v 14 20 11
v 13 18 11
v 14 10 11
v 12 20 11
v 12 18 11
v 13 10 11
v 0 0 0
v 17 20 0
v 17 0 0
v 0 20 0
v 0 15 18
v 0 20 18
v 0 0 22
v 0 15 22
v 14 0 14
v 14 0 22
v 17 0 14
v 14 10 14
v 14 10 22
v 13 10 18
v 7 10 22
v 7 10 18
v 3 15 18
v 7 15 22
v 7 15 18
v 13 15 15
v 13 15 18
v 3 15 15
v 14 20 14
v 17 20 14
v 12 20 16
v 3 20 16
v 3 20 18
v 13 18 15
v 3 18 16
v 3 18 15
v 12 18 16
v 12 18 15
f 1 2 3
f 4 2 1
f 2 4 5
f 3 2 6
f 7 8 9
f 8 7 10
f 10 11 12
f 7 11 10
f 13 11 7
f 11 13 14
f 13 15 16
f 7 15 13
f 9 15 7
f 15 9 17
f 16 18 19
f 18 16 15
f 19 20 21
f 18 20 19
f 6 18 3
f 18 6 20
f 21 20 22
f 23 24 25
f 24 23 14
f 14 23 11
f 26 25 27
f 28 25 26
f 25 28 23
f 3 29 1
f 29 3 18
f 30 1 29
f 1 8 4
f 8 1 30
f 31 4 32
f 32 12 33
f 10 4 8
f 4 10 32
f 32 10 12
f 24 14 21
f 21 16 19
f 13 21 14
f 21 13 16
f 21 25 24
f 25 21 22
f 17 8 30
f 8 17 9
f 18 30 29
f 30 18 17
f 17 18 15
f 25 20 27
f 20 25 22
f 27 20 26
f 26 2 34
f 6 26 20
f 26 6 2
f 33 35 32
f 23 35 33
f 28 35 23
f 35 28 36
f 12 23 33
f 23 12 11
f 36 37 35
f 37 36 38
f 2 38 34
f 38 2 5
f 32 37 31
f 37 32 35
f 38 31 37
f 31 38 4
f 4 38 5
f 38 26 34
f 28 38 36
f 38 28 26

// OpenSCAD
translate([3.5, 2.5, 5.5]) color([0.9007258804640697, 0.14067978971908934, 0.5728503338092871]) cube([7, 5, 11], center=true);
translate([10.5, 2.5, 5.5]) color([0.1912043400515635, 0.43401891336511733, 0.7163457448050065]) cube([7, 5, 11], center=true);
translate([3.5, 7.5, 5.5]) color([0.3841301513333275, 0.33069552050314754, 0.6480049557775331]) cube([7, 5, 11], center=true);
translate([10.5, 7.5, 5.5]) color([0.6874717059379091, 0.14801928734251768, 0.93323205939552]) cube([7, 5, 11], center=true);
translate([3.5, 12.5, 5.5]) color([0.14750072005511716, 0.31607169754224296, 0.2088660889148145]) cube([7, 5, 11], center=true);
translate([10.5, 12.5, 5.5]) color([0.1868244368145192, 0.3491672112743387, 0.9834841816788549]) cube([7, 5, 11], center=true);
translate([3.5, 17.5, 5.5]) color([0.427290207198605, 0.49195852420878716, 0.7297831417632067]) cube([7, 5, 11], center=true);
translate([10.5, 17.5, 5.5]) color([0.7955834433152874, 0.43927203819181504, 0.2042687131951023]) cube([7, 5, 11], center=true);
translate([3.5, 2.5, 16.5]) color([0.709997013582239, 0.9058221085991531, 0.03327924187503195]) cube([7, 5, 11], center=true);
translate([10.5, 2.5, 16.5]) color([0.6331757983912308, 0.8710093735661795, 0.3636101637556439]) cube([7, 5, 11], center=true);
translate([3.5, 7.5, 16.5]) color([0.7431628081058981, 0.6774926049513658, 0.23306417175218364]) cube([7, 5, 11], center=true);
translate([10.5, 7.5, 16.5]) color([0.2975271762349214, 0.0866296567389645, 0.8688435220131177]) cube([7, 5, 11], center=true);
translate([3.5, 12.5, 16.5]) color([0.7514921149941085, 0.7714305883456576, 0.8829516943772963]) cube([7, 5, 11], center=true);
translate([15.5, 2.5, 3.5]) color([0.4114323292545551, 0.05394001775890156, 0.696805048854085]) cube([3, 5, 7], center=true);
translate([15.5, 7.5, 3.5]) color([0.6656296547984208, 0.6485122289860075, 0.5471816206705559]) cube([3, 5, 7], center=true);
translate([15.5, 12.5, 3.5]) color([0.7344166333532061, 0.4306045068871984, 0.45460236437769275]) cube([3, 5, 7], center=true);
translate([15.5, 17.5, 3.5]) color([0.25475221651879554, 0.47565246533915095, 0.3371942584654095]) cube([3, 5, 7], center=true);
translate([15.5, 2.5, 10.5]) color([0.04223511400675217, 0.05255331220371673, 0.34980223330761895]) cube([3, 5, 7], center=true);
translate([15.5, 7.5, 10.5]) color([0.2898096938030986, 0.007130057665757694, 0.06369015415518986]) cube([3, 5, 7], center=true);
translate([15.5, 12.5, 10.5]) color([0.42774457246440645, 0.22216650821772055, 0.6086379170158094]) cube([3, 5, 7], center=true);
translate([15.5, 17.5, 10.5]) color([0.557768500755667, 0.22097295115667703, 0.19284823789822858]) cube([3, 5, 7], center=true);
translate([8.5, 12.5, 14.5]) color([0.6083188139076446, 0.606354511401297, 0.08562053587131313]) cube([3, 5, 7], center=true);
translate([11.5, 12.5, 14.5]) color([0.31903016062772993, 0.53590115499306, 0.8934753784920533]) cube([3, 5, 7], center=true);
translate([1.5, 17.5, 14.5]) color([0.25549985489866966, 0.5219903070058861, 0.1901317713313112]) cube([3, 5, 7], center=true);
translate([5.5, 16.5, 12.0]) color([0.08011594570868696, 0.8699478397109702, 0.3457472114844995]) cube([5, 3, 2], center=true);
translate([10.5, 16.5, 12.0]) color([0.837290862214726, 0.25127706432840136, 0.7290260027021367]) cube([5, 3, 2], center=true);
translate([4.5, 19.0, 13.5]) color([0.3013213449137814, 0.5169005458056509, 0.38467176448284957]) cube([3, 2, 5], center=true);
translate([7.5, 19.0, 13.5]) color([0.4820846642847386, 0.8719757028853922, 0.2399620044566907]) cube([3, 2, 5], center=true);
translate([10.5, 19.0, 13.5]) color([0.3058147052987177, 0.5519737755681405, 0.009208459116004764]) cube([3, 2, 5], center=true);
translate([5.5, 16.5, 14.0]) color([0.4953005367860557, 0.43819859659275806, 0.9171481192782721]) cube([5, 3, 2], center=true);
translate([10.5, 16.5, 14.0]) color([0.41212019308576986, 0.49358197644734136, 0.44010860560926524]) cube([5, 3, 2], center=true);
